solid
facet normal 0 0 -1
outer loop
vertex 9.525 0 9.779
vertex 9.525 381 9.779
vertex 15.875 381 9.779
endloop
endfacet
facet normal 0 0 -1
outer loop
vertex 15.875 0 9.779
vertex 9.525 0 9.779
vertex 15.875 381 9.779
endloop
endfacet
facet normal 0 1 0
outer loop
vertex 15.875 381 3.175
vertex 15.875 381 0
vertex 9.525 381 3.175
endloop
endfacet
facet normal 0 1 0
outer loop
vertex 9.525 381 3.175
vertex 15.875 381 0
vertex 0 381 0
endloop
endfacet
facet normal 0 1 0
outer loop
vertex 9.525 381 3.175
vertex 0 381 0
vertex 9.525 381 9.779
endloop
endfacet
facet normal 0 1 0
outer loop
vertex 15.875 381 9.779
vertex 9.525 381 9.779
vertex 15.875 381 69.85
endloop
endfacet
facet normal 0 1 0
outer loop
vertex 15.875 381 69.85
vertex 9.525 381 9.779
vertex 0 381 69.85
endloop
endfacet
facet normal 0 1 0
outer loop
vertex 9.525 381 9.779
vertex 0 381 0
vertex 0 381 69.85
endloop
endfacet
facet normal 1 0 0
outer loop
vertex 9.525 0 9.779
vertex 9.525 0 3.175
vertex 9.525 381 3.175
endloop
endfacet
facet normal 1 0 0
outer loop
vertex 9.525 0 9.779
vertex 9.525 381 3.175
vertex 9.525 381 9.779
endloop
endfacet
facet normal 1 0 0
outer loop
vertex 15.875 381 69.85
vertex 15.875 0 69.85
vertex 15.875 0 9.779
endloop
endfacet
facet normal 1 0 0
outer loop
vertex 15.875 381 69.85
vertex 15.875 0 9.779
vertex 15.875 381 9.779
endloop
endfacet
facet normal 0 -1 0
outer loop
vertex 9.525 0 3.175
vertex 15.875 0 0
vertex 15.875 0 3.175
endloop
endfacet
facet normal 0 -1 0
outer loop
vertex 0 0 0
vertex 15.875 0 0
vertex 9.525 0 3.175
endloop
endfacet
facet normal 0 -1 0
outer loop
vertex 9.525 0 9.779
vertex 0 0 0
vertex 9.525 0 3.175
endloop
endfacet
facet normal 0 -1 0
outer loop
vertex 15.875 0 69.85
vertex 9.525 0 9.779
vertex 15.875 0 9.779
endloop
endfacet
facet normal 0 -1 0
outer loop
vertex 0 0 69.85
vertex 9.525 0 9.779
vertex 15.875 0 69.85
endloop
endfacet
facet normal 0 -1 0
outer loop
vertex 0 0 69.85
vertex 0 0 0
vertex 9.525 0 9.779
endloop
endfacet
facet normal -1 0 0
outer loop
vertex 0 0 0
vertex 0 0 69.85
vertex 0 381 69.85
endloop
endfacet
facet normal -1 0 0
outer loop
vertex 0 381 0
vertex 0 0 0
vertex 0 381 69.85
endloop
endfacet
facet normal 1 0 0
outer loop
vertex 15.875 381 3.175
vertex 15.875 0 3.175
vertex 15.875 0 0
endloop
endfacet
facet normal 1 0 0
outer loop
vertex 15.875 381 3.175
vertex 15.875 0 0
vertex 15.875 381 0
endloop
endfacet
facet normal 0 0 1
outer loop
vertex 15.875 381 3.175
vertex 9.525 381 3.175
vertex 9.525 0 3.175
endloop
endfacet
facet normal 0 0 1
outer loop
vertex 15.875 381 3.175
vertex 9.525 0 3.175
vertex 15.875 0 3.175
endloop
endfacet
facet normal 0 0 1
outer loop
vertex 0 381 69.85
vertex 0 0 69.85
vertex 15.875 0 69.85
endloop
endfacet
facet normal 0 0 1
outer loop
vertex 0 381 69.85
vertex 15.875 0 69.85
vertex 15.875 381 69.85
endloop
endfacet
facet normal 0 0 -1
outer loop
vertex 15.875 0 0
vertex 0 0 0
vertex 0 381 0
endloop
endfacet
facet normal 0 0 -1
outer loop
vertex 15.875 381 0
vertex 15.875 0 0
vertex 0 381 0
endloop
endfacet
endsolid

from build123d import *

# Parameters (mm, degrees)
F0_W     = 381
F0_H     = 69.85
F1_DEPTH = 15.875
F2_W     = 6.35
F2_H     = 6.604
F3_DEPTH = 381


with BuildPart() as f1:
    # F0 (on Right) → F1 (new body)
    with BuildSketch(Plane.YZ):
        with Locations((190.5, 34.925)):
            Rectangle(F0_W, F0_H)
    extrude(amount=F1_DEPTH)

    # F2 (on face) → F3 (cut, through all)
    with BuildSketch(Plane.XZ):
        with Locations((12.7, 6.477)):
            Rectangle(F2_W, F2_H)
    extrude(amount=-F3_DEPTH, mode=Mode.SUBTRACT)


solid = f1.part
